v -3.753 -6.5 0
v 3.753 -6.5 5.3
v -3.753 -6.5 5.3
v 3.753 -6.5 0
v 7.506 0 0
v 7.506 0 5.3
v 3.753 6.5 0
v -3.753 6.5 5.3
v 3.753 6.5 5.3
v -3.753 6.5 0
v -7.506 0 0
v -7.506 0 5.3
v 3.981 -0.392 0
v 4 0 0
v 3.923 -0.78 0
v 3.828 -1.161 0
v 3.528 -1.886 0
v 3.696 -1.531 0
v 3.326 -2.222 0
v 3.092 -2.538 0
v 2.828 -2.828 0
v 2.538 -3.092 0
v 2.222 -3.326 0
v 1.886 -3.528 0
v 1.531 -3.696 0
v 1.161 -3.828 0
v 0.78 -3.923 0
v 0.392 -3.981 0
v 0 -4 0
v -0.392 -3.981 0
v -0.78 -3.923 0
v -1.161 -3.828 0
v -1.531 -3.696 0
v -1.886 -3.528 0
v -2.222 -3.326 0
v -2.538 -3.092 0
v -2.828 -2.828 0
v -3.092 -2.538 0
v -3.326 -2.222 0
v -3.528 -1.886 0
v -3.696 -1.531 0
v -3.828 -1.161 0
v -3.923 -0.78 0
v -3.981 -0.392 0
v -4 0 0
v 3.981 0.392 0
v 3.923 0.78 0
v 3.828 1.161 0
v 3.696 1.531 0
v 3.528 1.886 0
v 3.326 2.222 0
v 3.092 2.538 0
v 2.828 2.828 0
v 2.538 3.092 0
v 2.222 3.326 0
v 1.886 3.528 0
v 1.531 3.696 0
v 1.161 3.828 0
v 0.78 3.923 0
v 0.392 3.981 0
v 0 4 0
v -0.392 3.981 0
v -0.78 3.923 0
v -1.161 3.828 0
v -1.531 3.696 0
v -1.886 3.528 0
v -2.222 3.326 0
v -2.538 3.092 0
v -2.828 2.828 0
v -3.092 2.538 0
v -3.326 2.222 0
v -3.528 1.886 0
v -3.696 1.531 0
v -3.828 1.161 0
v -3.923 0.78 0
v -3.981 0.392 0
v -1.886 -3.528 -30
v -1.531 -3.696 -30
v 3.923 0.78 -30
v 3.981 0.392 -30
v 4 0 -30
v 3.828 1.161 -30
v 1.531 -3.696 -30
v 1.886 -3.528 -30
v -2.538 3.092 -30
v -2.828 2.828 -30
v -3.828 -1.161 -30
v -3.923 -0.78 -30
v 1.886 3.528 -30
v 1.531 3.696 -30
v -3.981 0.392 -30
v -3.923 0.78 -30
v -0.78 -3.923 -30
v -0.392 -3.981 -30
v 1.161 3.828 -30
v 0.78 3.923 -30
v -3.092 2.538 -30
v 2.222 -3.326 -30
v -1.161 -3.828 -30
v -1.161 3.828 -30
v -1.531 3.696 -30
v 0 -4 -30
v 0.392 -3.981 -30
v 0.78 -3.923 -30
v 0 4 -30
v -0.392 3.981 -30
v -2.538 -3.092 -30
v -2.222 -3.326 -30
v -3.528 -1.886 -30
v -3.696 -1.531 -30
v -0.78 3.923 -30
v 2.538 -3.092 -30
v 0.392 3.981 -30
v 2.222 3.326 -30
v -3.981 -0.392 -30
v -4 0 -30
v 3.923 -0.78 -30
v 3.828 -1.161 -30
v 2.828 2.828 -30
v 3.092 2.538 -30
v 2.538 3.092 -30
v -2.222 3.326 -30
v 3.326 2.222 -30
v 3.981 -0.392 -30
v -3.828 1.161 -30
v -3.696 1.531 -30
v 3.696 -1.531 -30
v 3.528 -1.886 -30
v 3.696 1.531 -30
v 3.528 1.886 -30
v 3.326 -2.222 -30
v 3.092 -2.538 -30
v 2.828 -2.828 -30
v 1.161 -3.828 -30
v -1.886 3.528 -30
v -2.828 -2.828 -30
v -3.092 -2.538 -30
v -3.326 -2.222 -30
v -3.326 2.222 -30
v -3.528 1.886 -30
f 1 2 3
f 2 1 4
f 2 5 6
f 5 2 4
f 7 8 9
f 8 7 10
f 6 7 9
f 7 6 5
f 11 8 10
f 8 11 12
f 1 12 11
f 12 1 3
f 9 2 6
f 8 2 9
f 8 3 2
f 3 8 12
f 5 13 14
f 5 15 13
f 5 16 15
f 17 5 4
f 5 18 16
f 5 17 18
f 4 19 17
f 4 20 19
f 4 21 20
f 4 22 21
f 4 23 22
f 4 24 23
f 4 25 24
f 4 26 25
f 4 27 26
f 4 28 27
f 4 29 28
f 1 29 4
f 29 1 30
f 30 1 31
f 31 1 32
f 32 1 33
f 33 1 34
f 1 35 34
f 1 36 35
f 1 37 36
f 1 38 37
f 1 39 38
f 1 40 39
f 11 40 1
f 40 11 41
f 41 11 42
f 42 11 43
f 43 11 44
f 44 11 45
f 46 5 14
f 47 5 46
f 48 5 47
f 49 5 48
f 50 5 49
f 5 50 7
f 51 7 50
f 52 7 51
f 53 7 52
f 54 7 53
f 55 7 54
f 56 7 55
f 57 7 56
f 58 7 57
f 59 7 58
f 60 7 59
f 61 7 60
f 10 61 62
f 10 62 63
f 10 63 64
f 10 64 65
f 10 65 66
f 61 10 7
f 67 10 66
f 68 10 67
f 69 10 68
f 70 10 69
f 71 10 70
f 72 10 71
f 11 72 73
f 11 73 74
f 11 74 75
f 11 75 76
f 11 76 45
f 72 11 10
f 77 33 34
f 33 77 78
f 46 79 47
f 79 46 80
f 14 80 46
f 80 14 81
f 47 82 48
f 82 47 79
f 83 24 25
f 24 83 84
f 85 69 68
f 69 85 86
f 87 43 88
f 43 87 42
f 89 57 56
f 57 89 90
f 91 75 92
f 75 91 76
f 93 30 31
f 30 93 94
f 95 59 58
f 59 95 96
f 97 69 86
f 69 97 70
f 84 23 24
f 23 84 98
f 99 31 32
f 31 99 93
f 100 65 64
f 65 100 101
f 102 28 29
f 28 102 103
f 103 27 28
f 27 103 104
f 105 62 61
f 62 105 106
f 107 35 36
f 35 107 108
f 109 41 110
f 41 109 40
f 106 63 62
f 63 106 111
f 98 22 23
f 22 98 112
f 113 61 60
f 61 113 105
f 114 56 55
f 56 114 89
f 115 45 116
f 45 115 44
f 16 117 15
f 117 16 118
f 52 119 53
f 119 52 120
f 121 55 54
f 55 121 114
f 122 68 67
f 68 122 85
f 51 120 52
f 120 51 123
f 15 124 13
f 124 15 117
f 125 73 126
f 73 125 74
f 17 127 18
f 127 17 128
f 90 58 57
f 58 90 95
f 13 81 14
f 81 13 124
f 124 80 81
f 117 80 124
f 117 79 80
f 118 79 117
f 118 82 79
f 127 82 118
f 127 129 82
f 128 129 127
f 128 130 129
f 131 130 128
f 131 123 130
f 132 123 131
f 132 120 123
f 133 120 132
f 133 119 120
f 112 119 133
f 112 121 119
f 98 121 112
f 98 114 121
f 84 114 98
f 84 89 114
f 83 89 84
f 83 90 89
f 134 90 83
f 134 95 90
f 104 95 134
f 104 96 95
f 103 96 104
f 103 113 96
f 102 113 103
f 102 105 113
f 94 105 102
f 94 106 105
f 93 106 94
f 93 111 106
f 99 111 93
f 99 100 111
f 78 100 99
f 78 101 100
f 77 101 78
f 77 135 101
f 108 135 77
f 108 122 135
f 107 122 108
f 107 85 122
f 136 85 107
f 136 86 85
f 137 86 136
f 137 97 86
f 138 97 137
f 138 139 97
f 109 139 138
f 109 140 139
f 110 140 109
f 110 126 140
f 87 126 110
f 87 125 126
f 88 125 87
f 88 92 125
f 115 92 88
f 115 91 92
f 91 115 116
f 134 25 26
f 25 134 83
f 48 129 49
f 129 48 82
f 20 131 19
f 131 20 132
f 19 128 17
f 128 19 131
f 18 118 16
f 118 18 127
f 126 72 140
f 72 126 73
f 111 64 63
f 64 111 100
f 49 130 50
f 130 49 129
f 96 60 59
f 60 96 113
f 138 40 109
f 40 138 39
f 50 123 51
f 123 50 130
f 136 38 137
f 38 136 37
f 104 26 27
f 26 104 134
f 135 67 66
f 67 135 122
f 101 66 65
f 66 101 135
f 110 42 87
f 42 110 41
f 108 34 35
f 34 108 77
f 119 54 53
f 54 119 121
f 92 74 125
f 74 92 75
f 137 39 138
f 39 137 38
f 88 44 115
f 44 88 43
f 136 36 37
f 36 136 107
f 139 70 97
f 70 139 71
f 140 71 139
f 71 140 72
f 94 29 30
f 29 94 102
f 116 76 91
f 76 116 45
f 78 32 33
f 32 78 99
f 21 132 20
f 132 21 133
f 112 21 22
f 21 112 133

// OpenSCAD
$fn = 64;

union() {
    // Hex head: across-flats 13 mm, height 5.3 mm
    cylinder(h = 5.3, r = 13 / sqrt(3), $fn = 6);

    // Shank: diameter 8 mm, length 30 mm, extending in -Z
    translate([0, 0, -30])
        cylinder(h = 30, d = 8);
}
